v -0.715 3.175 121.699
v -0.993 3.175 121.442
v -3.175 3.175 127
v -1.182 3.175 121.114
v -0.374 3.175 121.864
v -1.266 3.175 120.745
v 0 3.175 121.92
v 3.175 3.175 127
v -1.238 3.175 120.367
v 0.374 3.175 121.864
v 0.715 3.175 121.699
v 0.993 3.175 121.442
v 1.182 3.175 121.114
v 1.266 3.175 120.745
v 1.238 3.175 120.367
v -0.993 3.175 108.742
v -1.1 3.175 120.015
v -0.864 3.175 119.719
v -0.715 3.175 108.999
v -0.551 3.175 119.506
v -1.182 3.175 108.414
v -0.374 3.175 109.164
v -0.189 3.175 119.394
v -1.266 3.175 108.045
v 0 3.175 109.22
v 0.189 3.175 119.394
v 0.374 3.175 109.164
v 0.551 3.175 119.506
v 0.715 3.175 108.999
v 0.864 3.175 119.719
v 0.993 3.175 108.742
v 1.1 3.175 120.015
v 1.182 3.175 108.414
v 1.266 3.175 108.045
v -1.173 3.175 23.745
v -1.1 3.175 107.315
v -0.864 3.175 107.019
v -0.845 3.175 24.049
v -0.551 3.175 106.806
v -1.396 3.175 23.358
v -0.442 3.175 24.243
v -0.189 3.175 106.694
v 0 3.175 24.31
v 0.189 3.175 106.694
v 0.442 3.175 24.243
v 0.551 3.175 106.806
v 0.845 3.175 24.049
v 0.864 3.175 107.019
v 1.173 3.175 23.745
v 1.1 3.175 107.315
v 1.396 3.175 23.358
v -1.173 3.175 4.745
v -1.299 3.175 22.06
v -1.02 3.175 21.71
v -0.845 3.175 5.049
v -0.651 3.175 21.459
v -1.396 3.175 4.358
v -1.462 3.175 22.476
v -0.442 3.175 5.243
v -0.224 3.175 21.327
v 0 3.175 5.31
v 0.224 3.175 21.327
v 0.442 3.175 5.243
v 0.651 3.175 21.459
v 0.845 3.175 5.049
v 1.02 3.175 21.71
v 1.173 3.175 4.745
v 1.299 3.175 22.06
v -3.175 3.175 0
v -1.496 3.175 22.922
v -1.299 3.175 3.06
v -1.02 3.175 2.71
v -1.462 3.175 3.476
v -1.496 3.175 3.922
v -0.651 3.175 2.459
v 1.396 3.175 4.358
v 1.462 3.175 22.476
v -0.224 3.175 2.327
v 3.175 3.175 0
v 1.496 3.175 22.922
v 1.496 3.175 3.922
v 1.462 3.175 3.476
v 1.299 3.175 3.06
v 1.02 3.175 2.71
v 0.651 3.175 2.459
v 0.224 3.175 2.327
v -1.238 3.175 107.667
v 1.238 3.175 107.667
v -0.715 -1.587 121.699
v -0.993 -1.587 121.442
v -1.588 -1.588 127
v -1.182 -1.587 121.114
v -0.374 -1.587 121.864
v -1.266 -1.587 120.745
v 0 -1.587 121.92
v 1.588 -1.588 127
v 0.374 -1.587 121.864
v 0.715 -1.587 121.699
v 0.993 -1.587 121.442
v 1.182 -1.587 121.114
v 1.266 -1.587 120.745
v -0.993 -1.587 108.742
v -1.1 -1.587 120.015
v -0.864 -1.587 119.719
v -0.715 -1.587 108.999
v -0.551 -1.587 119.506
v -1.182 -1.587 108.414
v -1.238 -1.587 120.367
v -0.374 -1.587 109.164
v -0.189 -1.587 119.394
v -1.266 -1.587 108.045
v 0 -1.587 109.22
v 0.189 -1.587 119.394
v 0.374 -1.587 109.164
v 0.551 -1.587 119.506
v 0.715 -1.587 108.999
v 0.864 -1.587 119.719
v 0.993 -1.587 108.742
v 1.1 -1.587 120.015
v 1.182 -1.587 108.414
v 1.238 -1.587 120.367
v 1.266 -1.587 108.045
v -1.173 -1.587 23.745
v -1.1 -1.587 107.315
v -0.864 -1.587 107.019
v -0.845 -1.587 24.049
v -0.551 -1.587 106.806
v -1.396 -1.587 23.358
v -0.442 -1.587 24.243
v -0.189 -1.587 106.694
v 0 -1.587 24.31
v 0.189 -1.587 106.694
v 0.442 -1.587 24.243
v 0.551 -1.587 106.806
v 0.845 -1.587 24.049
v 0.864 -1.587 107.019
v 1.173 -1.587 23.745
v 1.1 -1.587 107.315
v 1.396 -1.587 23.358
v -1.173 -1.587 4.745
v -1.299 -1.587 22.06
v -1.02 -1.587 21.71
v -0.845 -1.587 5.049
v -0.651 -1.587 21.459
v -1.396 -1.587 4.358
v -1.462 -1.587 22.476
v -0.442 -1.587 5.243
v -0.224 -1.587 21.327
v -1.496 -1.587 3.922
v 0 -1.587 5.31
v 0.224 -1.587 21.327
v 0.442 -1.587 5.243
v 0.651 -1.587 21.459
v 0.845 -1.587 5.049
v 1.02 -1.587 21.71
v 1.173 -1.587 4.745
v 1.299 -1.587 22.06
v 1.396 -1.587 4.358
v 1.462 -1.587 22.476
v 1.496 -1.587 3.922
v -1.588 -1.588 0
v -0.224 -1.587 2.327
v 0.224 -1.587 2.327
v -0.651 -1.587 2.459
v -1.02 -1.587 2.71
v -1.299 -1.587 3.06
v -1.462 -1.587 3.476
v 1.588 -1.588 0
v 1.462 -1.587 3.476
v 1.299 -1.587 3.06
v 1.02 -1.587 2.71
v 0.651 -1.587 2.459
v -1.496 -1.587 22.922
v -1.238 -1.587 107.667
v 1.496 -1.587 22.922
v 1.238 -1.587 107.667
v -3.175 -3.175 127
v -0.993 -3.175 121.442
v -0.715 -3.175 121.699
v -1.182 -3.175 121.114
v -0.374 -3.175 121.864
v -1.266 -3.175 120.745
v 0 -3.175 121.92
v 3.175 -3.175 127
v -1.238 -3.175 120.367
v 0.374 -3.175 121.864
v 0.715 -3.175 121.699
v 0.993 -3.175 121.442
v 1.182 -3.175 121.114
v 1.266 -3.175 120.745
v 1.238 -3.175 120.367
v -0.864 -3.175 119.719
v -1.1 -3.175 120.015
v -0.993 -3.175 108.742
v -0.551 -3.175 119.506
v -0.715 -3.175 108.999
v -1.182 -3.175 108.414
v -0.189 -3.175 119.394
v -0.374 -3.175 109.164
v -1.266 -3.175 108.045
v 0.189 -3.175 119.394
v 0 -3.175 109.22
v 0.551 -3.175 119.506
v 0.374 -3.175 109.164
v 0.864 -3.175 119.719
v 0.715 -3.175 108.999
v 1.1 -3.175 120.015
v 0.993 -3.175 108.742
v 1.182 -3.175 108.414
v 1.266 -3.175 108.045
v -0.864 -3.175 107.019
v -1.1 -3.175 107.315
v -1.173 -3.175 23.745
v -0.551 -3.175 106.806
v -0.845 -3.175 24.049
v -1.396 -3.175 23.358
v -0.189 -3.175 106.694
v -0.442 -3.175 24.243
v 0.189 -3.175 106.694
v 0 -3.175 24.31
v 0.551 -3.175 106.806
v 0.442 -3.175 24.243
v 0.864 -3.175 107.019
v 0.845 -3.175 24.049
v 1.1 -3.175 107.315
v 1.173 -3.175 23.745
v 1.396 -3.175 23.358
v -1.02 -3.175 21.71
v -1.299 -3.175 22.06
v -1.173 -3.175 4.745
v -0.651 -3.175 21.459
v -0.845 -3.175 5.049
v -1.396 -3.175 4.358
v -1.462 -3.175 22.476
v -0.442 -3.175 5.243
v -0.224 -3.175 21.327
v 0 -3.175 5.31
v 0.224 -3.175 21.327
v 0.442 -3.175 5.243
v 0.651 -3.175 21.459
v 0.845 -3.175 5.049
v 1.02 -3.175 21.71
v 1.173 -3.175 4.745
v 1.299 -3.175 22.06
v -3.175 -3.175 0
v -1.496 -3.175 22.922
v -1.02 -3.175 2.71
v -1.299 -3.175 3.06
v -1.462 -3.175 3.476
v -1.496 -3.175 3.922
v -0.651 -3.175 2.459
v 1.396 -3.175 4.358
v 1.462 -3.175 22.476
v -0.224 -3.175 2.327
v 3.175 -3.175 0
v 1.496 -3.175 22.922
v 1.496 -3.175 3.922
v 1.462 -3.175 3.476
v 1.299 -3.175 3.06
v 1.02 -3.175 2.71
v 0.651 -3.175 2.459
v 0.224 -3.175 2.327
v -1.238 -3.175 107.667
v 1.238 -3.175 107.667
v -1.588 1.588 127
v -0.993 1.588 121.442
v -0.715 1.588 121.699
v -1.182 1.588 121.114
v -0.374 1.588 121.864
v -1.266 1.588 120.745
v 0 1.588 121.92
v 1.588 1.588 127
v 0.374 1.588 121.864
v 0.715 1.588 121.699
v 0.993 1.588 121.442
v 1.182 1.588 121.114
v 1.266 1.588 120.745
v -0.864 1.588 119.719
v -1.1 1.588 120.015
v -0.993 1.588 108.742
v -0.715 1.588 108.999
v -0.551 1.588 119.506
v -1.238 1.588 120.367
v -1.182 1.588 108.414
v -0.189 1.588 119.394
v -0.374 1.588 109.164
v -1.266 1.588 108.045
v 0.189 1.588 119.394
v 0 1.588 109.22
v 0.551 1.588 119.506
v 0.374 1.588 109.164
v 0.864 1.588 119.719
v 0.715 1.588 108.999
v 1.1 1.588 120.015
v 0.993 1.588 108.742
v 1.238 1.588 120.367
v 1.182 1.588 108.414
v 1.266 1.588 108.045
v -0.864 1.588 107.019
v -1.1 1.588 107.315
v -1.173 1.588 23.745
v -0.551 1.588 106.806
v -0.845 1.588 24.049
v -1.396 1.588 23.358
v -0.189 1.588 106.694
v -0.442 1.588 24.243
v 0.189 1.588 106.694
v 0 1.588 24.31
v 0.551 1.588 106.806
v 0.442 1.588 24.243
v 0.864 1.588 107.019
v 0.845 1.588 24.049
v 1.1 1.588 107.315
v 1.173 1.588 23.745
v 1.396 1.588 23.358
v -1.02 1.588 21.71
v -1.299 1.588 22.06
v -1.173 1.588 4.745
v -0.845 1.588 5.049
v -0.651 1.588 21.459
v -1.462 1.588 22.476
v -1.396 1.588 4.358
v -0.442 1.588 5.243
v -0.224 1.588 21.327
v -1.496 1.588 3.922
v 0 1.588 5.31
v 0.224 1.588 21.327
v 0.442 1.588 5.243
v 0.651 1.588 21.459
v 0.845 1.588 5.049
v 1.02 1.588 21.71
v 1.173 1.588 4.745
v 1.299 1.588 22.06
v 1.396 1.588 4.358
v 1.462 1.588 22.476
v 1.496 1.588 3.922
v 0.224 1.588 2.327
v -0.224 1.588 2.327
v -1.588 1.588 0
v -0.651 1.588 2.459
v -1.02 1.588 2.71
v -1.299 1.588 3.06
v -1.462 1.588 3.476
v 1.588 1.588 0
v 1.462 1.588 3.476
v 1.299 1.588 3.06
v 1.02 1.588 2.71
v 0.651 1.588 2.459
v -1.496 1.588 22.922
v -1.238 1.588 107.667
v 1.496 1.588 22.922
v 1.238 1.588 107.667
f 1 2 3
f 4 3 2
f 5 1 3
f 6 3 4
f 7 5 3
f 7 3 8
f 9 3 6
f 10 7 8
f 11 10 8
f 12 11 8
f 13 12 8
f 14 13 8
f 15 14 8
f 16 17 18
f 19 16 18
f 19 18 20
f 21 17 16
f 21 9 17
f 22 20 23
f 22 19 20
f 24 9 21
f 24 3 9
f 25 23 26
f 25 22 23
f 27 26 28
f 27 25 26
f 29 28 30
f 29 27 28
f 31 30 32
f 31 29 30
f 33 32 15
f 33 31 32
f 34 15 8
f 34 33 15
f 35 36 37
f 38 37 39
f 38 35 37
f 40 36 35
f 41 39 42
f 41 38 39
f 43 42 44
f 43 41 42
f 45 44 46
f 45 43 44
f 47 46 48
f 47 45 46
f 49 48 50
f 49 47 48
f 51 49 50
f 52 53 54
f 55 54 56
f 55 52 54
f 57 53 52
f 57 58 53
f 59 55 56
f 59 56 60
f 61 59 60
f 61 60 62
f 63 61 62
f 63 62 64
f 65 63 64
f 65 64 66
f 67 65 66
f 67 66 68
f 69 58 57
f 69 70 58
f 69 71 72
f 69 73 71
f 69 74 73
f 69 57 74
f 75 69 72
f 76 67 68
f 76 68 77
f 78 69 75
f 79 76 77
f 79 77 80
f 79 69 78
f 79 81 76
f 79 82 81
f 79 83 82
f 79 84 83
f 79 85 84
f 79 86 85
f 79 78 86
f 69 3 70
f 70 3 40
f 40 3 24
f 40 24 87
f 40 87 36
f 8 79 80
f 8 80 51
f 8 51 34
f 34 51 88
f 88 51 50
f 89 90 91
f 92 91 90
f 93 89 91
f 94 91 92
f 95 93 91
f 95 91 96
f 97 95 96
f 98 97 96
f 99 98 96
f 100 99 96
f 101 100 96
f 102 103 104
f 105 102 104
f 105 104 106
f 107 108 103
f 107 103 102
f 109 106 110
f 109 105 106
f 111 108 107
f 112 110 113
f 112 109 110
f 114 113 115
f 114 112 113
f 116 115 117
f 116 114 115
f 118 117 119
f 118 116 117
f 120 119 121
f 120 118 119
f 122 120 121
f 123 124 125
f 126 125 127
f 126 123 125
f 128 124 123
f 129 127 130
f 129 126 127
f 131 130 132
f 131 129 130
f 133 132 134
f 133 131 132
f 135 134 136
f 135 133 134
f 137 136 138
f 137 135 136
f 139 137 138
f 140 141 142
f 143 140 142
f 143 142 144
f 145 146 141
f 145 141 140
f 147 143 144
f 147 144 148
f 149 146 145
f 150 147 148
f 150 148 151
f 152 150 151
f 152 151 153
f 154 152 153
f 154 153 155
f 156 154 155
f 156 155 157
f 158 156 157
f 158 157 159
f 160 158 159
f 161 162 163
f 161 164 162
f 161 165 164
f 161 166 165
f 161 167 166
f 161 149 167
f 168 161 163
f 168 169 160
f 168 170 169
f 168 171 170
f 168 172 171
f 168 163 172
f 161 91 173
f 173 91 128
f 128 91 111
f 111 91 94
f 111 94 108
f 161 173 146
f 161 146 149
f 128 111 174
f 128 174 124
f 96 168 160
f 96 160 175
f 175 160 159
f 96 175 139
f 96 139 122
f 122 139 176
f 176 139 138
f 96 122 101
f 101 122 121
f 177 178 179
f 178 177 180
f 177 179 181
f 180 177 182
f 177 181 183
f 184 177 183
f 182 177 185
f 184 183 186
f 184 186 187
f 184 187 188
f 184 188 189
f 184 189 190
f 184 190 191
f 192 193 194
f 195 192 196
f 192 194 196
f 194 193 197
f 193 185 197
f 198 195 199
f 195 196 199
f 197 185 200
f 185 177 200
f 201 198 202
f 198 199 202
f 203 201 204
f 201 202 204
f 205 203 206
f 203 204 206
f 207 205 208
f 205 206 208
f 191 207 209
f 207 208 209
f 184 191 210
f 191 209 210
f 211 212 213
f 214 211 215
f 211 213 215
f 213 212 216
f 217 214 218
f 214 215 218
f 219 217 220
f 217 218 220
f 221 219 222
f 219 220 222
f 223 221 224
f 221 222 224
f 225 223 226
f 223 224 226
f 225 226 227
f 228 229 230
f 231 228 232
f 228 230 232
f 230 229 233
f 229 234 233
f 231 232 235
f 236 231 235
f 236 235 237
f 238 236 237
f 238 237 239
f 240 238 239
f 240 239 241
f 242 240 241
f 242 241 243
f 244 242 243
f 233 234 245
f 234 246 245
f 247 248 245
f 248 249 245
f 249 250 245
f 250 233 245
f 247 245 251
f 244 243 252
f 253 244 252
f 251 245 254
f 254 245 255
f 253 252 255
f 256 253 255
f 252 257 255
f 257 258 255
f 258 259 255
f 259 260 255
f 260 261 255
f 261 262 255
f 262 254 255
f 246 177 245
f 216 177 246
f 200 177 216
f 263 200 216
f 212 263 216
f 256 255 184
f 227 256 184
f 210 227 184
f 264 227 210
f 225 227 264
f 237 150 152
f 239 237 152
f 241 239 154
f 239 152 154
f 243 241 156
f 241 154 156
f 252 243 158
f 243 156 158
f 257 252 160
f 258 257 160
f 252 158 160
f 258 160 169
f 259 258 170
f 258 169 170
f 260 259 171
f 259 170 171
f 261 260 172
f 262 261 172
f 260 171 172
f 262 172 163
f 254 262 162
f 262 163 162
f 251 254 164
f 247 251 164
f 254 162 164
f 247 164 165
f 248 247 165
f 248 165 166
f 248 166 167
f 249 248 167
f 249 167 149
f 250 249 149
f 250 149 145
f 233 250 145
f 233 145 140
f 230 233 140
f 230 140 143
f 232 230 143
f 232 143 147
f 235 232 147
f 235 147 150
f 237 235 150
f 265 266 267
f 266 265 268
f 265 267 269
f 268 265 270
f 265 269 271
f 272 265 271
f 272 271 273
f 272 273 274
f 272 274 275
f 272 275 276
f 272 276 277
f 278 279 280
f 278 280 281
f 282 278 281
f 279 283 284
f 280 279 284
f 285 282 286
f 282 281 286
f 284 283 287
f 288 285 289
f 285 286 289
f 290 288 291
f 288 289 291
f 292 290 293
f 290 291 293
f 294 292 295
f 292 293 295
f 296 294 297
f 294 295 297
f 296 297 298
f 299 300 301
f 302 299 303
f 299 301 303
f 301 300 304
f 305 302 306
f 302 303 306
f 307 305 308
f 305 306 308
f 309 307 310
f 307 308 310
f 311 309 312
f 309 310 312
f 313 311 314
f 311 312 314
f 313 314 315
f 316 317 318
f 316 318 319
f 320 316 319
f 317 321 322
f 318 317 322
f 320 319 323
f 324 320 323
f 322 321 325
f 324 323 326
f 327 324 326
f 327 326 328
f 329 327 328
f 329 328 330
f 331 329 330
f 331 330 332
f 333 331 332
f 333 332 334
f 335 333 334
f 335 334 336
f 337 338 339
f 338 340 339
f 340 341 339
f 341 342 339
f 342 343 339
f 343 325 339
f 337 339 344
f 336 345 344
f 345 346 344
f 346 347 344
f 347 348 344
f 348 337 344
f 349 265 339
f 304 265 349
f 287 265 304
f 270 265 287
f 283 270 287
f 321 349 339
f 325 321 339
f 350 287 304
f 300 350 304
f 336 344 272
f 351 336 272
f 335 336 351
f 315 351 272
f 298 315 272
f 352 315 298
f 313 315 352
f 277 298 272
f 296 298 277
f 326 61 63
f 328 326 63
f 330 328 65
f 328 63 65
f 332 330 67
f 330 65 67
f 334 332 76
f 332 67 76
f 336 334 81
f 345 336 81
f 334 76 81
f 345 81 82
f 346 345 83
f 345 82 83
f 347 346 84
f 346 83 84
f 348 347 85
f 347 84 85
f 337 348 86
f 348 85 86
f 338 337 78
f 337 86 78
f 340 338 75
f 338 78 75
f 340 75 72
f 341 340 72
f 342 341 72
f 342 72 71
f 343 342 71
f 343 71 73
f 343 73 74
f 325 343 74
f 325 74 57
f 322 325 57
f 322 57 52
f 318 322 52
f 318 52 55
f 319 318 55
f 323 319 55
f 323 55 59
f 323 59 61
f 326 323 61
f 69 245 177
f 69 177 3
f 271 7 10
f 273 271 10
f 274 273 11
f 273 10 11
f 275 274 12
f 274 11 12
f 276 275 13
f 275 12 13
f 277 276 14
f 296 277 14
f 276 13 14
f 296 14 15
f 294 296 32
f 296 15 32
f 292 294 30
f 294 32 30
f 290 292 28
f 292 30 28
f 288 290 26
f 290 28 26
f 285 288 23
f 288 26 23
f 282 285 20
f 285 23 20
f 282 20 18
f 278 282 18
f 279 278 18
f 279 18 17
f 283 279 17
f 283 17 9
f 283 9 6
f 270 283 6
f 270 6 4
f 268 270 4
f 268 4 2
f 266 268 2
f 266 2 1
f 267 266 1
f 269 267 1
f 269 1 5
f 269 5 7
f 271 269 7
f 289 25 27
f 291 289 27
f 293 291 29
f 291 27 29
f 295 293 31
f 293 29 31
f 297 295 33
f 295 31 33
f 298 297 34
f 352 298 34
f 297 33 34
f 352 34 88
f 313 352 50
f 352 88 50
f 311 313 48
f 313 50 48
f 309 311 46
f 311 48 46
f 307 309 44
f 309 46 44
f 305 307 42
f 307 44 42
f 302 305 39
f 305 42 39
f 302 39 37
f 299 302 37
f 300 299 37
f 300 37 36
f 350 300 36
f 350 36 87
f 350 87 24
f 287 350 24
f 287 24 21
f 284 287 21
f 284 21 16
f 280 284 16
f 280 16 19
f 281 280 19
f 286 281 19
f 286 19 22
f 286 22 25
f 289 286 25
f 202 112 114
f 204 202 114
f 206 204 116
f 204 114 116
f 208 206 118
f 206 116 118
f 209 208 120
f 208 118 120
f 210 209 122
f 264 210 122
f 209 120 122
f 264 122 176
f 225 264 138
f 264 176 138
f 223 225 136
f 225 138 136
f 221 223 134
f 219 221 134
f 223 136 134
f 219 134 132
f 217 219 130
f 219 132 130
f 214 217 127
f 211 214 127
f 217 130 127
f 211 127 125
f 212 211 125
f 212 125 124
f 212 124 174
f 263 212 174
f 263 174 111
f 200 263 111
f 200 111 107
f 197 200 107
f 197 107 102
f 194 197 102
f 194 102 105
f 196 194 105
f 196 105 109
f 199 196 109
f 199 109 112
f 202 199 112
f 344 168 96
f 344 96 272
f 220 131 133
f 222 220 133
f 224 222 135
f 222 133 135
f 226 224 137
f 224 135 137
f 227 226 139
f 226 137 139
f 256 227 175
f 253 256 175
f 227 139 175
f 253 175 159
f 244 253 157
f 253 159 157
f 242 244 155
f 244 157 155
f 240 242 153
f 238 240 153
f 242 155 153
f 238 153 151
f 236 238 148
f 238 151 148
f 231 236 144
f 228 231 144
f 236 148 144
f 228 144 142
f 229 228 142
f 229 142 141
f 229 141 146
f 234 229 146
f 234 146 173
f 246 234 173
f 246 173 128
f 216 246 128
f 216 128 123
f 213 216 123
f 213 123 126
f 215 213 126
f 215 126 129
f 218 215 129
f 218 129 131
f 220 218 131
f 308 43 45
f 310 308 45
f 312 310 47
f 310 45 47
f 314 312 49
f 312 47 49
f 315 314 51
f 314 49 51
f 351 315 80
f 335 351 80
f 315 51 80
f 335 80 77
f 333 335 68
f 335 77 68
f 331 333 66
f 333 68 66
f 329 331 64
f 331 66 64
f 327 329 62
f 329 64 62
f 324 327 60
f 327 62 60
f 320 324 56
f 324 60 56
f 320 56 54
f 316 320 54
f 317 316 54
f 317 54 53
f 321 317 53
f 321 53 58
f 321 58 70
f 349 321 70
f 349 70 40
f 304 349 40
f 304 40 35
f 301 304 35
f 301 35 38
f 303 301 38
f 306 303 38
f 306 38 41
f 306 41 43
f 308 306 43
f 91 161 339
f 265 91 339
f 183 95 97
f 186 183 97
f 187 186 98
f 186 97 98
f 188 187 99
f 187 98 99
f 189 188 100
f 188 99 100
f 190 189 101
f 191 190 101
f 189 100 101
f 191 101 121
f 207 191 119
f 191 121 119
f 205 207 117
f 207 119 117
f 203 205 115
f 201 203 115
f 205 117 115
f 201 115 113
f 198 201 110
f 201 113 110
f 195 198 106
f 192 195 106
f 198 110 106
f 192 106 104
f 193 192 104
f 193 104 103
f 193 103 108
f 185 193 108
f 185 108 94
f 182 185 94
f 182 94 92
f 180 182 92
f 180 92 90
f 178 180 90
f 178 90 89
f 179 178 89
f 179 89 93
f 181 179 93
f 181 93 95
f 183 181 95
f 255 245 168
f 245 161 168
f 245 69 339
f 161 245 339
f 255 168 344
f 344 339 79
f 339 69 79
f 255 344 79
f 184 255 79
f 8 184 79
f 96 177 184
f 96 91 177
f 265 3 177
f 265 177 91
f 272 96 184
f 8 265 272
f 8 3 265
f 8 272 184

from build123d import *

# Parameters (mm, degrees)
SKETCH1_W           = 6.35
SKETCH1_H           = 6.35
SKETCH1_W_2         = 3.175
SKETCH1_H_2         = 3.175
BOSS_EXTRUDE1_DEPTH = 127
SKETCH3_R           = 1.27
CUT_EXTRUDE1_DEPTH  = 12.7
SKETCH4_R           = 1.5
CUT_EXTRUDE2_DEPTH  = 12.7


with BuildPart() as part:
    # Sketch1 → Boss-Extrude1 (new body)
    with BuildSketch(Plane.XY):
        Rectangle(SKETCH1_W, SKETCH1_H)
        Rectangle(SKETCH1_W_2, SKETCH1_H_2, mode=Mode.SUBTRACT)
    extrude(amount=BOSS_EXTRUDE1_DEPTH)

    # Sketch3 → Cut-Extrude1 (cut)
    with BuildSketch(Plane(origin=(0, 3.175, 0), x_dir=(1, 0, 0), z_dir=(0, 1, 0))):
        with Locations(Location((0, -120.65, 0), (0, 0, 270))):
            Circle(SKETCH3_R)
        with Locations(Location((0, -107.95, 0), (0, 0, 270))):
            Circle(SKETCH3_R)
    extrude(amount=-CUT_EXTRUDE1_DEPTH, mode=Mode.SUBTRACT)

    # Sketch4 → Cut-Extrude2 (cut)
    with BuildSketch(Plane(origin=(0, 3.175, 0), x_dir=(1, 0, 0), z_dir=(0, 1, 0))):
        with Locations(Location((0, -3.81, 0), (0, 0, 270))):
            Circle(SKETCH4_R)
        with Locations(Location((0, -22.81, 0), (0, 0, 270))):
            Circle(SKETCH4_R)
    extrude(amount=-CUT_EXTRUDE2_DEPTH, mode=Mode.SUBTRACT)


solid = part.part
